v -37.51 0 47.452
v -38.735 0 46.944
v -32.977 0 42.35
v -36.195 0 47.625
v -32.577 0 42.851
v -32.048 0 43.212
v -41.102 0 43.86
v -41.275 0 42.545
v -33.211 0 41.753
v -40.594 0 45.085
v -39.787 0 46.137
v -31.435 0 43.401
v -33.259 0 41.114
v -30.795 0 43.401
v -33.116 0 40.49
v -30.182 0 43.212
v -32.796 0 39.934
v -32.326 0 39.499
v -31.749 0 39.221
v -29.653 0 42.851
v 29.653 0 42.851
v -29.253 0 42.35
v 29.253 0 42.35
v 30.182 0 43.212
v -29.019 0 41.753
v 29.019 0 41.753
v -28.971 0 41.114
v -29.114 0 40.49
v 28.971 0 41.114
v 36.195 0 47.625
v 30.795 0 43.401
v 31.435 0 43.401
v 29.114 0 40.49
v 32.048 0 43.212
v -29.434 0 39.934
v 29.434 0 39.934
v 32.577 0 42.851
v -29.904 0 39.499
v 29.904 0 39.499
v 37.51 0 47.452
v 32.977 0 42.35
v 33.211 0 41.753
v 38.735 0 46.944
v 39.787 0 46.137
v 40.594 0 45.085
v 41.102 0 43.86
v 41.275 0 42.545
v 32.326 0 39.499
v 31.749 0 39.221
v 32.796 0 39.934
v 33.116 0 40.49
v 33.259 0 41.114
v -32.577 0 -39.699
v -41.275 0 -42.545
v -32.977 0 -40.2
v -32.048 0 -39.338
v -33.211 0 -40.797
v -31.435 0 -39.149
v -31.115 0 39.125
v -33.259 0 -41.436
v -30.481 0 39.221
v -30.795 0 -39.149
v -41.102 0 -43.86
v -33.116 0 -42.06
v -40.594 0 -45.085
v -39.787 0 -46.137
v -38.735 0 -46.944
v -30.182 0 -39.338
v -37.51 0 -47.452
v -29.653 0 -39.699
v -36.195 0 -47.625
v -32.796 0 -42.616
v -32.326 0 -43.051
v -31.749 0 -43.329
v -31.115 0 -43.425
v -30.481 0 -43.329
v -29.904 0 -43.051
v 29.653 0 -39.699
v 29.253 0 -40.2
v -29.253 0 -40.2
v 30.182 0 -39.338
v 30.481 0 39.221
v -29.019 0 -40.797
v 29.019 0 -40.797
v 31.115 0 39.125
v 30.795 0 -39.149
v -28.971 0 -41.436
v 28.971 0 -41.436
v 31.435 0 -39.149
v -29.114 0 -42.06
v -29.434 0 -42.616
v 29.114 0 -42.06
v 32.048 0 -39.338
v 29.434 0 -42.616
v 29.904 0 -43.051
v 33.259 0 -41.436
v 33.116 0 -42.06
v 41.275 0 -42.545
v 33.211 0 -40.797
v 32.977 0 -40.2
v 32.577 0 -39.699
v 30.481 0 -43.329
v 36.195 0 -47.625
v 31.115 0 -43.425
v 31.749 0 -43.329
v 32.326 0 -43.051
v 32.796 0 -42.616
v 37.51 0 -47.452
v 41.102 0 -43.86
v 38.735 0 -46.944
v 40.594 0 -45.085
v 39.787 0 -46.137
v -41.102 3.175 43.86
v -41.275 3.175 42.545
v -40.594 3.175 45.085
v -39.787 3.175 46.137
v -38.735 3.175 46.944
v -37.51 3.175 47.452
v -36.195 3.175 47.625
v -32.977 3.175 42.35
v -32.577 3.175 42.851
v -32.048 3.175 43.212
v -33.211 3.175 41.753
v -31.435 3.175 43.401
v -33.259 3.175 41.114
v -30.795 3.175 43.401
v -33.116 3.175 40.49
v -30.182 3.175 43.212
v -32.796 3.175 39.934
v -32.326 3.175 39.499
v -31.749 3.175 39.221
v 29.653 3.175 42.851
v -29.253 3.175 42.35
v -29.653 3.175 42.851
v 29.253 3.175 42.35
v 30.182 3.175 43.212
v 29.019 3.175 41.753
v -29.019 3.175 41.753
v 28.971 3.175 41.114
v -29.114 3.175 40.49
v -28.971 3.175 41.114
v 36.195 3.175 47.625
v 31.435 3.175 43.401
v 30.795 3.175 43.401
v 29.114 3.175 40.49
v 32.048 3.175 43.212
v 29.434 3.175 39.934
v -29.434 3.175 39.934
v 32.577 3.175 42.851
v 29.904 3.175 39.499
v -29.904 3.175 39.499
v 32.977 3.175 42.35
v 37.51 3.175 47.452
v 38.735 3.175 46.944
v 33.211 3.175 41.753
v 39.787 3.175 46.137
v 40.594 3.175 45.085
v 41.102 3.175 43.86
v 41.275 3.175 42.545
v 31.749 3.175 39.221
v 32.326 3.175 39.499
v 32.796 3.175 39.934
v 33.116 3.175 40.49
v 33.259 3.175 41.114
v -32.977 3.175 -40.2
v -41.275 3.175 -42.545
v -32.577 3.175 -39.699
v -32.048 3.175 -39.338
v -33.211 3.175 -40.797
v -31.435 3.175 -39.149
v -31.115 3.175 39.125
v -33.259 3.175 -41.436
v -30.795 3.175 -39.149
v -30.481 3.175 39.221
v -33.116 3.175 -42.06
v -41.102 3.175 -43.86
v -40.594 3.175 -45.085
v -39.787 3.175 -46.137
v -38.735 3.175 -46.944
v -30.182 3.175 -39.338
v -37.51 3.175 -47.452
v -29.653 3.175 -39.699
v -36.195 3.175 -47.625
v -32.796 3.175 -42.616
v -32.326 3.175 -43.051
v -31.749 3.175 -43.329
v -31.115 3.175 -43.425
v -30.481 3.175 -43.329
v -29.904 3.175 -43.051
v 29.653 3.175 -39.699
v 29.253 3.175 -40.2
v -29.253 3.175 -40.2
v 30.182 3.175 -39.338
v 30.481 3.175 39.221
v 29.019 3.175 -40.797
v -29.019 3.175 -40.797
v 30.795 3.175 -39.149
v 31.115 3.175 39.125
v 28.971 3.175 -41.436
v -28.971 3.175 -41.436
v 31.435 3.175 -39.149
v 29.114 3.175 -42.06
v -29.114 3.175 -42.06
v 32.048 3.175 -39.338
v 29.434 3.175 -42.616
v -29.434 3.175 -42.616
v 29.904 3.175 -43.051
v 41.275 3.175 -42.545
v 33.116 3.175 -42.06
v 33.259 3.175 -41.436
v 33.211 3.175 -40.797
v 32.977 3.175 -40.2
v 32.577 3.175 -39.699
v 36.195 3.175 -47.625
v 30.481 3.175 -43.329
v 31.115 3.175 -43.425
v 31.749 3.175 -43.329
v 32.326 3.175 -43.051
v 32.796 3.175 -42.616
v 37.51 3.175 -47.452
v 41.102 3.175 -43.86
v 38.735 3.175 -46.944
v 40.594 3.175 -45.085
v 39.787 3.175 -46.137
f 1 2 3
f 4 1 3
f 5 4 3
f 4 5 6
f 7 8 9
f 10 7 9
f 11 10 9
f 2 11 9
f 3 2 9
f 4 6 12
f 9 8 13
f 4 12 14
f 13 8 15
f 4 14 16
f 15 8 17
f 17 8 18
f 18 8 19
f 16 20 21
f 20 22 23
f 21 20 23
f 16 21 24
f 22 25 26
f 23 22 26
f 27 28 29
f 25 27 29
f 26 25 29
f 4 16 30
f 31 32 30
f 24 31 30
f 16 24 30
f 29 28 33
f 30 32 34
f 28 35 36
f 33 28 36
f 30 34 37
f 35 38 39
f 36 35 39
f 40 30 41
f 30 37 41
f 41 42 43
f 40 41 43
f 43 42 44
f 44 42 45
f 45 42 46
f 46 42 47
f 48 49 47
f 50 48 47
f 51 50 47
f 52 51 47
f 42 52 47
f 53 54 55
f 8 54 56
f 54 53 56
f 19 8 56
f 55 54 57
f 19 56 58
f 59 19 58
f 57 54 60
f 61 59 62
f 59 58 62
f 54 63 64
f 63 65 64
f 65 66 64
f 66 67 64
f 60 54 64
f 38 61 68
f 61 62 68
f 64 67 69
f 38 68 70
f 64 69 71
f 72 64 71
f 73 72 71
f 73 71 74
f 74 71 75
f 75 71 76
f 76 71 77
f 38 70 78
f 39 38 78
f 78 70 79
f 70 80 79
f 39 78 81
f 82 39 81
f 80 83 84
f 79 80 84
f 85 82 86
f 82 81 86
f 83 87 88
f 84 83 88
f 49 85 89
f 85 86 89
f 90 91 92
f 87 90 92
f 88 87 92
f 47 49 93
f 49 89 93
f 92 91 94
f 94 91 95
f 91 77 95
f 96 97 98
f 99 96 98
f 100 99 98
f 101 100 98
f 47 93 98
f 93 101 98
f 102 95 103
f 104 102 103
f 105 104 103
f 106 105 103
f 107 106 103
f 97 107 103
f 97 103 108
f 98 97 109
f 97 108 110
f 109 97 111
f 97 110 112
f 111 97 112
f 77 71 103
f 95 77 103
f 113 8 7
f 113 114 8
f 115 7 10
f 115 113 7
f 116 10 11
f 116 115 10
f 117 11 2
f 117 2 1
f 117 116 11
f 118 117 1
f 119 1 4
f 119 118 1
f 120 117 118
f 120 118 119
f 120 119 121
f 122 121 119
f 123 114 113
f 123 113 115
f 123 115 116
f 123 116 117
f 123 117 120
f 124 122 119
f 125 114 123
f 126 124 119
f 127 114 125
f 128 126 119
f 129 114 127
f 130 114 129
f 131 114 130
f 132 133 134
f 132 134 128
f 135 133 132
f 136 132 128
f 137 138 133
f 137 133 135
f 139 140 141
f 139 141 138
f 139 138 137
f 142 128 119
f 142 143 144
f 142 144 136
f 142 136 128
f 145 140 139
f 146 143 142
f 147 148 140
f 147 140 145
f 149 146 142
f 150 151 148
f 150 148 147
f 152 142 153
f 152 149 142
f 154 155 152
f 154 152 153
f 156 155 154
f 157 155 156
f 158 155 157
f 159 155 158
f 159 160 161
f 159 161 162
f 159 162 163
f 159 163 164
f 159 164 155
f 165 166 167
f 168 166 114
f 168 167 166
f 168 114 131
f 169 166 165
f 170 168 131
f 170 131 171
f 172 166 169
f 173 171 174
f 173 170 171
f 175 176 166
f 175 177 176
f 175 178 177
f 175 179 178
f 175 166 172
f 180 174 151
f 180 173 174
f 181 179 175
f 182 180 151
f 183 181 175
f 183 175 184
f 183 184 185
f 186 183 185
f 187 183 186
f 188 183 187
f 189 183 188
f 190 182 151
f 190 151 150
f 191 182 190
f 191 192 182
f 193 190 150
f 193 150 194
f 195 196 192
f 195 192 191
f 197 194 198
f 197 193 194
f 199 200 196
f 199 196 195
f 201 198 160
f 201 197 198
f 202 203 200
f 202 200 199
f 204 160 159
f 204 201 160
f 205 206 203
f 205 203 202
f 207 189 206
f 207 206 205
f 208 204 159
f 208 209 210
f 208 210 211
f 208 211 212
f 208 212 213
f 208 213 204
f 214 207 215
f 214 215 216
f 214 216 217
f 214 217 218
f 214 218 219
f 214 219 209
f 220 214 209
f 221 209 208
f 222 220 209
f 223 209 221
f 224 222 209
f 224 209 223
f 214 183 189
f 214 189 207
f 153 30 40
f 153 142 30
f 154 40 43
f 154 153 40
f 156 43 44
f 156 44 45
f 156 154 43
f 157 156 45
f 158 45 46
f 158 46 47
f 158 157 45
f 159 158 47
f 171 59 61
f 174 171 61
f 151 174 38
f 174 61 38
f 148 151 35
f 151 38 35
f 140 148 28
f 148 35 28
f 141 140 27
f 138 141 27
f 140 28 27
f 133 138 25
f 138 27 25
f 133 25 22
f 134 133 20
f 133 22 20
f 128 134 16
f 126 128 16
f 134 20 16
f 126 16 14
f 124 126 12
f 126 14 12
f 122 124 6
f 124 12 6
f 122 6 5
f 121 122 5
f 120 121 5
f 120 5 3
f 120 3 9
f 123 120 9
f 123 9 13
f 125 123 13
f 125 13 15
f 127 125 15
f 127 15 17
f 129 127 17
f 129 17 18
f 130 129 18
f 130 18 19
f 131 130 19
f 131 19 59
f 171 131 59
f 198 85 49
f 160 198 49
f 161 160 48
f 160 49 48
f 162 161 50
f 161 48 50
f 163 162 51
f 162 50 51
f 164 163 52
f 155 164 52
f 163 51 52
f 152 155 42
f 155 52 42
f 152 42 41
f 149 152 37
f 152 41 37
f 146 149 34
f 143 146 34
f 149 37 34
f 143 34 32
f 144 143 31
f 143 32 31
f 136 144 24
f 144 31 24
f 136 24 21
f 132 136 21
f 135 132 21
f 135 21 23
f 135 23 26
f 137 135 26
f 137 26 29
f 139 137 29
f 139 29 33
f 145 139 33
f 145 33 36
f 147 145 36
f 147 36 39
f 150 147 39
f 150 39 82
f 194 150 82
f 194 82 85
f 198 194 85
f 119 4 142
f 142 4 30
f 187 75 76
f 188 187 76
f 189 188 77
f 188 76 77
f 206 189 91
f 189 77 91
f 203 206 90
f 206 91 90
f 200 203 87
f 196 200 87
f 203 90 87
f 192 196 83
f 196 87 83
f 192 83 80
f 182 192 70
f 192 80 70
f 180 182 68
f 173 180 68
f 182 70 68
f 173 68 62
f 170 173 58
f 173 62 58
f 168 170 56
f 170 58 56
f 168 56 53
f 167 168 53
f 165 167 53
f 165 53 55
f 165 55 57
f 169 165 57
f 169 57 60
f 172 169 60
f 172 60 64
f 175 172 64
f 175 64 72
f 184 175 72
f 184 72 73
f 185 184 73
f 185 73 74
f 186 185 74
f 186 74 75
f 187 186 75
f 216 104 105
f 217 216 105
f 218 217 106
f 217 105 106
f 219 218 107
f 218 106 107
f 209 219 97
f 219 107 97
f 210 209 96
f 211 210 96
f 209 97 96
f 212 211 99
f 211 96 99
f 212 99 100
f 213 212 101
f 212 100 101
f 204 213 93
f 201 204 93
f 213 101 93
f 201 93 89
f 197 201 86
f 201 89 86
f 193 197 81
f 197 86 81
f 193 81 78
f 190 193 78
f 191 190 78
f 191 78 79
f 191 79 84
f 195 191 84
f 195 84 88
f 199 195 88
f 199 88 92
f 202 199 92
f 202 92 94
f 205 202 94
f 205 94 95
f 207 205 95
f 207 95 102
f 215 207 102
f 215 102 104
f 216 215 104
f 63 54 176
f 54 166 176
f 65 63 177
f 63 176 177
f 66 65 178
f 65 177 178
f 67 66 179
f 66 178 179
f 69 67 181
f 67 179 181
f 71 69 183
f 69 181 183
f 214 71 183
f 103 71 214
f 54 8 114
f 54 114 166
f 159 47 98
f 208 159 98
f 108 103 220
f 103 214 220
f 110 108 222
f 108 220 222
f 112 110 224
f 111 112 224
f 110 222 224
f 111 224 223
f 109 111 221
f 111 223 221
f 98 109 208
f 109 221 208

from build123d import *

# Parameters (mm, degrees)
SKETCH1_W             = 82.55
SKETCH1_H             = 95.25
MAIN_EXTRUSION_DEPTH  = 3.175
SKETCH2_R             = 2.15
STAND_OFF_HOLES_DEPTH = 64.101876953
FILLET1_R             = 5.08


with BuildPart() as part:
    # Sketch1 → Main Extrusion (new body)
    with BuildSketch(Plane(origin=(0, 0, 0), x_dir=(1, 0, 0), z_dir=(0, 1, 0))):
        Rectangle(SKETCH1_W, SKETCH1_H)
    extrude(amount=MAIN_EXTRUSION_DEPTH)

    # Sketch2 → Stand off holes (cut, through all)
    with BuildSketch(Plane(origin=(0, 0, 0), x_dir=(-1, 0, 0), z_dir=(0, -1, 0))):
        with Locations(Location((-31.115, -41.275, 0), (0, 0, 90))):
            Circle(SKETCH2_R)
        with Locations(Location((-31.115, 41.275, 0), (0, 0, 90))):
            Circle(SKETCH2_R)
        with Locations(Location((31.115, 41.275, 0), (0, 0, 90))):
            Circle(SKETCH2_R)
        with Locations(Location((31.115, -41.275, 0), (0, 0, 90))):
            Circle(SKETCH2_R)
    extrude(amount=-STAND_OFF_HOLES_DEPTH, mode=Mode.SUBTRACT)

    # Fillet1
    fillet1_edges = [part.edges().sort_by_distance(p)[0] for p in [
        (-41.275, 1.5875, -47.625),
        (41.275, 1.5875, -47.625),
        (41.275, 1.5875, 47.625),
        (-41.275, 1.5875, 47.625),
    ]]
    fillet(fillet1_edges, radius=FILLET1_R)


solid = part.part
